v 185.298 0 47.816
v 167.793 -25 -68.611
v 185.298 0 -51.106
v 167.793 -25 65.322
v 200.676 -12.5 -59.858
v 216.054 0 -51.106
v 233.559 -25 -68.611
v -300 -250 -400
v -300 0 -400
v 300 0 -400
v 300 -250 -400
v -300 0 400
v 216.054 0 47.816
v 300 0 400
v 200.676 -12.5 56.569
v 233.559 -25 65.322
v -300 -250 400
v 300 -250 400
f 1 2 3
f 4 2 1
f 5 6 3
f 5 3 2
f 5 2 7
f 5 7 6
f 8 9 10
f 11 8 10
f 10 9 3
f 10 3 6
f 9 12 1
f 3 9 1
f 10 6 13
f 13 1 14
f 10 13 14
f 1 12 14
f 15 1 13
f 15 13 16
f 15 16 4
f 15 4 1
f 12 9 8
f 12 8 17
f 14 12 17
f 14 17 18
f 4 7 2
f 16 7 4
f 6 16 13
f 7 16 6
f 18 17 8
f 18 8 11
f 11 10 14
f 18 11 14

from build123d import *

# Parameters (mm, degrees)
F0_W     = 600
F0_H     = 800
F1_DEPTH = 250
F2_W     = 30.7556688786
F2_H     = 98.9223569632
F3_DEPTH = 25
F3_TAPER = -35


with BuildPart() as f1:
    # F0 (on Front) → F1 (new body)
    with BuildSketch(Plane.XZ):
        Rectangle(F0_W, F0_H)
    extrude(amount=F1_DEPTH)

    # F2 (on face) → F3 (cut)
    with BuildSketch(Plane(origin=(0, 0, 0), x_dir=(-1, 0, 0), z_dir=(0, 1, 0))):
        with Locations((-200.6758749485, -1.6446858644)):
            Rectangle(F2_W, F2_H)
    extrude(amount=-F3_DEPTH, taper=F3_TAPER, mode=Mode.SUBTRACT)


solid = f1.part
